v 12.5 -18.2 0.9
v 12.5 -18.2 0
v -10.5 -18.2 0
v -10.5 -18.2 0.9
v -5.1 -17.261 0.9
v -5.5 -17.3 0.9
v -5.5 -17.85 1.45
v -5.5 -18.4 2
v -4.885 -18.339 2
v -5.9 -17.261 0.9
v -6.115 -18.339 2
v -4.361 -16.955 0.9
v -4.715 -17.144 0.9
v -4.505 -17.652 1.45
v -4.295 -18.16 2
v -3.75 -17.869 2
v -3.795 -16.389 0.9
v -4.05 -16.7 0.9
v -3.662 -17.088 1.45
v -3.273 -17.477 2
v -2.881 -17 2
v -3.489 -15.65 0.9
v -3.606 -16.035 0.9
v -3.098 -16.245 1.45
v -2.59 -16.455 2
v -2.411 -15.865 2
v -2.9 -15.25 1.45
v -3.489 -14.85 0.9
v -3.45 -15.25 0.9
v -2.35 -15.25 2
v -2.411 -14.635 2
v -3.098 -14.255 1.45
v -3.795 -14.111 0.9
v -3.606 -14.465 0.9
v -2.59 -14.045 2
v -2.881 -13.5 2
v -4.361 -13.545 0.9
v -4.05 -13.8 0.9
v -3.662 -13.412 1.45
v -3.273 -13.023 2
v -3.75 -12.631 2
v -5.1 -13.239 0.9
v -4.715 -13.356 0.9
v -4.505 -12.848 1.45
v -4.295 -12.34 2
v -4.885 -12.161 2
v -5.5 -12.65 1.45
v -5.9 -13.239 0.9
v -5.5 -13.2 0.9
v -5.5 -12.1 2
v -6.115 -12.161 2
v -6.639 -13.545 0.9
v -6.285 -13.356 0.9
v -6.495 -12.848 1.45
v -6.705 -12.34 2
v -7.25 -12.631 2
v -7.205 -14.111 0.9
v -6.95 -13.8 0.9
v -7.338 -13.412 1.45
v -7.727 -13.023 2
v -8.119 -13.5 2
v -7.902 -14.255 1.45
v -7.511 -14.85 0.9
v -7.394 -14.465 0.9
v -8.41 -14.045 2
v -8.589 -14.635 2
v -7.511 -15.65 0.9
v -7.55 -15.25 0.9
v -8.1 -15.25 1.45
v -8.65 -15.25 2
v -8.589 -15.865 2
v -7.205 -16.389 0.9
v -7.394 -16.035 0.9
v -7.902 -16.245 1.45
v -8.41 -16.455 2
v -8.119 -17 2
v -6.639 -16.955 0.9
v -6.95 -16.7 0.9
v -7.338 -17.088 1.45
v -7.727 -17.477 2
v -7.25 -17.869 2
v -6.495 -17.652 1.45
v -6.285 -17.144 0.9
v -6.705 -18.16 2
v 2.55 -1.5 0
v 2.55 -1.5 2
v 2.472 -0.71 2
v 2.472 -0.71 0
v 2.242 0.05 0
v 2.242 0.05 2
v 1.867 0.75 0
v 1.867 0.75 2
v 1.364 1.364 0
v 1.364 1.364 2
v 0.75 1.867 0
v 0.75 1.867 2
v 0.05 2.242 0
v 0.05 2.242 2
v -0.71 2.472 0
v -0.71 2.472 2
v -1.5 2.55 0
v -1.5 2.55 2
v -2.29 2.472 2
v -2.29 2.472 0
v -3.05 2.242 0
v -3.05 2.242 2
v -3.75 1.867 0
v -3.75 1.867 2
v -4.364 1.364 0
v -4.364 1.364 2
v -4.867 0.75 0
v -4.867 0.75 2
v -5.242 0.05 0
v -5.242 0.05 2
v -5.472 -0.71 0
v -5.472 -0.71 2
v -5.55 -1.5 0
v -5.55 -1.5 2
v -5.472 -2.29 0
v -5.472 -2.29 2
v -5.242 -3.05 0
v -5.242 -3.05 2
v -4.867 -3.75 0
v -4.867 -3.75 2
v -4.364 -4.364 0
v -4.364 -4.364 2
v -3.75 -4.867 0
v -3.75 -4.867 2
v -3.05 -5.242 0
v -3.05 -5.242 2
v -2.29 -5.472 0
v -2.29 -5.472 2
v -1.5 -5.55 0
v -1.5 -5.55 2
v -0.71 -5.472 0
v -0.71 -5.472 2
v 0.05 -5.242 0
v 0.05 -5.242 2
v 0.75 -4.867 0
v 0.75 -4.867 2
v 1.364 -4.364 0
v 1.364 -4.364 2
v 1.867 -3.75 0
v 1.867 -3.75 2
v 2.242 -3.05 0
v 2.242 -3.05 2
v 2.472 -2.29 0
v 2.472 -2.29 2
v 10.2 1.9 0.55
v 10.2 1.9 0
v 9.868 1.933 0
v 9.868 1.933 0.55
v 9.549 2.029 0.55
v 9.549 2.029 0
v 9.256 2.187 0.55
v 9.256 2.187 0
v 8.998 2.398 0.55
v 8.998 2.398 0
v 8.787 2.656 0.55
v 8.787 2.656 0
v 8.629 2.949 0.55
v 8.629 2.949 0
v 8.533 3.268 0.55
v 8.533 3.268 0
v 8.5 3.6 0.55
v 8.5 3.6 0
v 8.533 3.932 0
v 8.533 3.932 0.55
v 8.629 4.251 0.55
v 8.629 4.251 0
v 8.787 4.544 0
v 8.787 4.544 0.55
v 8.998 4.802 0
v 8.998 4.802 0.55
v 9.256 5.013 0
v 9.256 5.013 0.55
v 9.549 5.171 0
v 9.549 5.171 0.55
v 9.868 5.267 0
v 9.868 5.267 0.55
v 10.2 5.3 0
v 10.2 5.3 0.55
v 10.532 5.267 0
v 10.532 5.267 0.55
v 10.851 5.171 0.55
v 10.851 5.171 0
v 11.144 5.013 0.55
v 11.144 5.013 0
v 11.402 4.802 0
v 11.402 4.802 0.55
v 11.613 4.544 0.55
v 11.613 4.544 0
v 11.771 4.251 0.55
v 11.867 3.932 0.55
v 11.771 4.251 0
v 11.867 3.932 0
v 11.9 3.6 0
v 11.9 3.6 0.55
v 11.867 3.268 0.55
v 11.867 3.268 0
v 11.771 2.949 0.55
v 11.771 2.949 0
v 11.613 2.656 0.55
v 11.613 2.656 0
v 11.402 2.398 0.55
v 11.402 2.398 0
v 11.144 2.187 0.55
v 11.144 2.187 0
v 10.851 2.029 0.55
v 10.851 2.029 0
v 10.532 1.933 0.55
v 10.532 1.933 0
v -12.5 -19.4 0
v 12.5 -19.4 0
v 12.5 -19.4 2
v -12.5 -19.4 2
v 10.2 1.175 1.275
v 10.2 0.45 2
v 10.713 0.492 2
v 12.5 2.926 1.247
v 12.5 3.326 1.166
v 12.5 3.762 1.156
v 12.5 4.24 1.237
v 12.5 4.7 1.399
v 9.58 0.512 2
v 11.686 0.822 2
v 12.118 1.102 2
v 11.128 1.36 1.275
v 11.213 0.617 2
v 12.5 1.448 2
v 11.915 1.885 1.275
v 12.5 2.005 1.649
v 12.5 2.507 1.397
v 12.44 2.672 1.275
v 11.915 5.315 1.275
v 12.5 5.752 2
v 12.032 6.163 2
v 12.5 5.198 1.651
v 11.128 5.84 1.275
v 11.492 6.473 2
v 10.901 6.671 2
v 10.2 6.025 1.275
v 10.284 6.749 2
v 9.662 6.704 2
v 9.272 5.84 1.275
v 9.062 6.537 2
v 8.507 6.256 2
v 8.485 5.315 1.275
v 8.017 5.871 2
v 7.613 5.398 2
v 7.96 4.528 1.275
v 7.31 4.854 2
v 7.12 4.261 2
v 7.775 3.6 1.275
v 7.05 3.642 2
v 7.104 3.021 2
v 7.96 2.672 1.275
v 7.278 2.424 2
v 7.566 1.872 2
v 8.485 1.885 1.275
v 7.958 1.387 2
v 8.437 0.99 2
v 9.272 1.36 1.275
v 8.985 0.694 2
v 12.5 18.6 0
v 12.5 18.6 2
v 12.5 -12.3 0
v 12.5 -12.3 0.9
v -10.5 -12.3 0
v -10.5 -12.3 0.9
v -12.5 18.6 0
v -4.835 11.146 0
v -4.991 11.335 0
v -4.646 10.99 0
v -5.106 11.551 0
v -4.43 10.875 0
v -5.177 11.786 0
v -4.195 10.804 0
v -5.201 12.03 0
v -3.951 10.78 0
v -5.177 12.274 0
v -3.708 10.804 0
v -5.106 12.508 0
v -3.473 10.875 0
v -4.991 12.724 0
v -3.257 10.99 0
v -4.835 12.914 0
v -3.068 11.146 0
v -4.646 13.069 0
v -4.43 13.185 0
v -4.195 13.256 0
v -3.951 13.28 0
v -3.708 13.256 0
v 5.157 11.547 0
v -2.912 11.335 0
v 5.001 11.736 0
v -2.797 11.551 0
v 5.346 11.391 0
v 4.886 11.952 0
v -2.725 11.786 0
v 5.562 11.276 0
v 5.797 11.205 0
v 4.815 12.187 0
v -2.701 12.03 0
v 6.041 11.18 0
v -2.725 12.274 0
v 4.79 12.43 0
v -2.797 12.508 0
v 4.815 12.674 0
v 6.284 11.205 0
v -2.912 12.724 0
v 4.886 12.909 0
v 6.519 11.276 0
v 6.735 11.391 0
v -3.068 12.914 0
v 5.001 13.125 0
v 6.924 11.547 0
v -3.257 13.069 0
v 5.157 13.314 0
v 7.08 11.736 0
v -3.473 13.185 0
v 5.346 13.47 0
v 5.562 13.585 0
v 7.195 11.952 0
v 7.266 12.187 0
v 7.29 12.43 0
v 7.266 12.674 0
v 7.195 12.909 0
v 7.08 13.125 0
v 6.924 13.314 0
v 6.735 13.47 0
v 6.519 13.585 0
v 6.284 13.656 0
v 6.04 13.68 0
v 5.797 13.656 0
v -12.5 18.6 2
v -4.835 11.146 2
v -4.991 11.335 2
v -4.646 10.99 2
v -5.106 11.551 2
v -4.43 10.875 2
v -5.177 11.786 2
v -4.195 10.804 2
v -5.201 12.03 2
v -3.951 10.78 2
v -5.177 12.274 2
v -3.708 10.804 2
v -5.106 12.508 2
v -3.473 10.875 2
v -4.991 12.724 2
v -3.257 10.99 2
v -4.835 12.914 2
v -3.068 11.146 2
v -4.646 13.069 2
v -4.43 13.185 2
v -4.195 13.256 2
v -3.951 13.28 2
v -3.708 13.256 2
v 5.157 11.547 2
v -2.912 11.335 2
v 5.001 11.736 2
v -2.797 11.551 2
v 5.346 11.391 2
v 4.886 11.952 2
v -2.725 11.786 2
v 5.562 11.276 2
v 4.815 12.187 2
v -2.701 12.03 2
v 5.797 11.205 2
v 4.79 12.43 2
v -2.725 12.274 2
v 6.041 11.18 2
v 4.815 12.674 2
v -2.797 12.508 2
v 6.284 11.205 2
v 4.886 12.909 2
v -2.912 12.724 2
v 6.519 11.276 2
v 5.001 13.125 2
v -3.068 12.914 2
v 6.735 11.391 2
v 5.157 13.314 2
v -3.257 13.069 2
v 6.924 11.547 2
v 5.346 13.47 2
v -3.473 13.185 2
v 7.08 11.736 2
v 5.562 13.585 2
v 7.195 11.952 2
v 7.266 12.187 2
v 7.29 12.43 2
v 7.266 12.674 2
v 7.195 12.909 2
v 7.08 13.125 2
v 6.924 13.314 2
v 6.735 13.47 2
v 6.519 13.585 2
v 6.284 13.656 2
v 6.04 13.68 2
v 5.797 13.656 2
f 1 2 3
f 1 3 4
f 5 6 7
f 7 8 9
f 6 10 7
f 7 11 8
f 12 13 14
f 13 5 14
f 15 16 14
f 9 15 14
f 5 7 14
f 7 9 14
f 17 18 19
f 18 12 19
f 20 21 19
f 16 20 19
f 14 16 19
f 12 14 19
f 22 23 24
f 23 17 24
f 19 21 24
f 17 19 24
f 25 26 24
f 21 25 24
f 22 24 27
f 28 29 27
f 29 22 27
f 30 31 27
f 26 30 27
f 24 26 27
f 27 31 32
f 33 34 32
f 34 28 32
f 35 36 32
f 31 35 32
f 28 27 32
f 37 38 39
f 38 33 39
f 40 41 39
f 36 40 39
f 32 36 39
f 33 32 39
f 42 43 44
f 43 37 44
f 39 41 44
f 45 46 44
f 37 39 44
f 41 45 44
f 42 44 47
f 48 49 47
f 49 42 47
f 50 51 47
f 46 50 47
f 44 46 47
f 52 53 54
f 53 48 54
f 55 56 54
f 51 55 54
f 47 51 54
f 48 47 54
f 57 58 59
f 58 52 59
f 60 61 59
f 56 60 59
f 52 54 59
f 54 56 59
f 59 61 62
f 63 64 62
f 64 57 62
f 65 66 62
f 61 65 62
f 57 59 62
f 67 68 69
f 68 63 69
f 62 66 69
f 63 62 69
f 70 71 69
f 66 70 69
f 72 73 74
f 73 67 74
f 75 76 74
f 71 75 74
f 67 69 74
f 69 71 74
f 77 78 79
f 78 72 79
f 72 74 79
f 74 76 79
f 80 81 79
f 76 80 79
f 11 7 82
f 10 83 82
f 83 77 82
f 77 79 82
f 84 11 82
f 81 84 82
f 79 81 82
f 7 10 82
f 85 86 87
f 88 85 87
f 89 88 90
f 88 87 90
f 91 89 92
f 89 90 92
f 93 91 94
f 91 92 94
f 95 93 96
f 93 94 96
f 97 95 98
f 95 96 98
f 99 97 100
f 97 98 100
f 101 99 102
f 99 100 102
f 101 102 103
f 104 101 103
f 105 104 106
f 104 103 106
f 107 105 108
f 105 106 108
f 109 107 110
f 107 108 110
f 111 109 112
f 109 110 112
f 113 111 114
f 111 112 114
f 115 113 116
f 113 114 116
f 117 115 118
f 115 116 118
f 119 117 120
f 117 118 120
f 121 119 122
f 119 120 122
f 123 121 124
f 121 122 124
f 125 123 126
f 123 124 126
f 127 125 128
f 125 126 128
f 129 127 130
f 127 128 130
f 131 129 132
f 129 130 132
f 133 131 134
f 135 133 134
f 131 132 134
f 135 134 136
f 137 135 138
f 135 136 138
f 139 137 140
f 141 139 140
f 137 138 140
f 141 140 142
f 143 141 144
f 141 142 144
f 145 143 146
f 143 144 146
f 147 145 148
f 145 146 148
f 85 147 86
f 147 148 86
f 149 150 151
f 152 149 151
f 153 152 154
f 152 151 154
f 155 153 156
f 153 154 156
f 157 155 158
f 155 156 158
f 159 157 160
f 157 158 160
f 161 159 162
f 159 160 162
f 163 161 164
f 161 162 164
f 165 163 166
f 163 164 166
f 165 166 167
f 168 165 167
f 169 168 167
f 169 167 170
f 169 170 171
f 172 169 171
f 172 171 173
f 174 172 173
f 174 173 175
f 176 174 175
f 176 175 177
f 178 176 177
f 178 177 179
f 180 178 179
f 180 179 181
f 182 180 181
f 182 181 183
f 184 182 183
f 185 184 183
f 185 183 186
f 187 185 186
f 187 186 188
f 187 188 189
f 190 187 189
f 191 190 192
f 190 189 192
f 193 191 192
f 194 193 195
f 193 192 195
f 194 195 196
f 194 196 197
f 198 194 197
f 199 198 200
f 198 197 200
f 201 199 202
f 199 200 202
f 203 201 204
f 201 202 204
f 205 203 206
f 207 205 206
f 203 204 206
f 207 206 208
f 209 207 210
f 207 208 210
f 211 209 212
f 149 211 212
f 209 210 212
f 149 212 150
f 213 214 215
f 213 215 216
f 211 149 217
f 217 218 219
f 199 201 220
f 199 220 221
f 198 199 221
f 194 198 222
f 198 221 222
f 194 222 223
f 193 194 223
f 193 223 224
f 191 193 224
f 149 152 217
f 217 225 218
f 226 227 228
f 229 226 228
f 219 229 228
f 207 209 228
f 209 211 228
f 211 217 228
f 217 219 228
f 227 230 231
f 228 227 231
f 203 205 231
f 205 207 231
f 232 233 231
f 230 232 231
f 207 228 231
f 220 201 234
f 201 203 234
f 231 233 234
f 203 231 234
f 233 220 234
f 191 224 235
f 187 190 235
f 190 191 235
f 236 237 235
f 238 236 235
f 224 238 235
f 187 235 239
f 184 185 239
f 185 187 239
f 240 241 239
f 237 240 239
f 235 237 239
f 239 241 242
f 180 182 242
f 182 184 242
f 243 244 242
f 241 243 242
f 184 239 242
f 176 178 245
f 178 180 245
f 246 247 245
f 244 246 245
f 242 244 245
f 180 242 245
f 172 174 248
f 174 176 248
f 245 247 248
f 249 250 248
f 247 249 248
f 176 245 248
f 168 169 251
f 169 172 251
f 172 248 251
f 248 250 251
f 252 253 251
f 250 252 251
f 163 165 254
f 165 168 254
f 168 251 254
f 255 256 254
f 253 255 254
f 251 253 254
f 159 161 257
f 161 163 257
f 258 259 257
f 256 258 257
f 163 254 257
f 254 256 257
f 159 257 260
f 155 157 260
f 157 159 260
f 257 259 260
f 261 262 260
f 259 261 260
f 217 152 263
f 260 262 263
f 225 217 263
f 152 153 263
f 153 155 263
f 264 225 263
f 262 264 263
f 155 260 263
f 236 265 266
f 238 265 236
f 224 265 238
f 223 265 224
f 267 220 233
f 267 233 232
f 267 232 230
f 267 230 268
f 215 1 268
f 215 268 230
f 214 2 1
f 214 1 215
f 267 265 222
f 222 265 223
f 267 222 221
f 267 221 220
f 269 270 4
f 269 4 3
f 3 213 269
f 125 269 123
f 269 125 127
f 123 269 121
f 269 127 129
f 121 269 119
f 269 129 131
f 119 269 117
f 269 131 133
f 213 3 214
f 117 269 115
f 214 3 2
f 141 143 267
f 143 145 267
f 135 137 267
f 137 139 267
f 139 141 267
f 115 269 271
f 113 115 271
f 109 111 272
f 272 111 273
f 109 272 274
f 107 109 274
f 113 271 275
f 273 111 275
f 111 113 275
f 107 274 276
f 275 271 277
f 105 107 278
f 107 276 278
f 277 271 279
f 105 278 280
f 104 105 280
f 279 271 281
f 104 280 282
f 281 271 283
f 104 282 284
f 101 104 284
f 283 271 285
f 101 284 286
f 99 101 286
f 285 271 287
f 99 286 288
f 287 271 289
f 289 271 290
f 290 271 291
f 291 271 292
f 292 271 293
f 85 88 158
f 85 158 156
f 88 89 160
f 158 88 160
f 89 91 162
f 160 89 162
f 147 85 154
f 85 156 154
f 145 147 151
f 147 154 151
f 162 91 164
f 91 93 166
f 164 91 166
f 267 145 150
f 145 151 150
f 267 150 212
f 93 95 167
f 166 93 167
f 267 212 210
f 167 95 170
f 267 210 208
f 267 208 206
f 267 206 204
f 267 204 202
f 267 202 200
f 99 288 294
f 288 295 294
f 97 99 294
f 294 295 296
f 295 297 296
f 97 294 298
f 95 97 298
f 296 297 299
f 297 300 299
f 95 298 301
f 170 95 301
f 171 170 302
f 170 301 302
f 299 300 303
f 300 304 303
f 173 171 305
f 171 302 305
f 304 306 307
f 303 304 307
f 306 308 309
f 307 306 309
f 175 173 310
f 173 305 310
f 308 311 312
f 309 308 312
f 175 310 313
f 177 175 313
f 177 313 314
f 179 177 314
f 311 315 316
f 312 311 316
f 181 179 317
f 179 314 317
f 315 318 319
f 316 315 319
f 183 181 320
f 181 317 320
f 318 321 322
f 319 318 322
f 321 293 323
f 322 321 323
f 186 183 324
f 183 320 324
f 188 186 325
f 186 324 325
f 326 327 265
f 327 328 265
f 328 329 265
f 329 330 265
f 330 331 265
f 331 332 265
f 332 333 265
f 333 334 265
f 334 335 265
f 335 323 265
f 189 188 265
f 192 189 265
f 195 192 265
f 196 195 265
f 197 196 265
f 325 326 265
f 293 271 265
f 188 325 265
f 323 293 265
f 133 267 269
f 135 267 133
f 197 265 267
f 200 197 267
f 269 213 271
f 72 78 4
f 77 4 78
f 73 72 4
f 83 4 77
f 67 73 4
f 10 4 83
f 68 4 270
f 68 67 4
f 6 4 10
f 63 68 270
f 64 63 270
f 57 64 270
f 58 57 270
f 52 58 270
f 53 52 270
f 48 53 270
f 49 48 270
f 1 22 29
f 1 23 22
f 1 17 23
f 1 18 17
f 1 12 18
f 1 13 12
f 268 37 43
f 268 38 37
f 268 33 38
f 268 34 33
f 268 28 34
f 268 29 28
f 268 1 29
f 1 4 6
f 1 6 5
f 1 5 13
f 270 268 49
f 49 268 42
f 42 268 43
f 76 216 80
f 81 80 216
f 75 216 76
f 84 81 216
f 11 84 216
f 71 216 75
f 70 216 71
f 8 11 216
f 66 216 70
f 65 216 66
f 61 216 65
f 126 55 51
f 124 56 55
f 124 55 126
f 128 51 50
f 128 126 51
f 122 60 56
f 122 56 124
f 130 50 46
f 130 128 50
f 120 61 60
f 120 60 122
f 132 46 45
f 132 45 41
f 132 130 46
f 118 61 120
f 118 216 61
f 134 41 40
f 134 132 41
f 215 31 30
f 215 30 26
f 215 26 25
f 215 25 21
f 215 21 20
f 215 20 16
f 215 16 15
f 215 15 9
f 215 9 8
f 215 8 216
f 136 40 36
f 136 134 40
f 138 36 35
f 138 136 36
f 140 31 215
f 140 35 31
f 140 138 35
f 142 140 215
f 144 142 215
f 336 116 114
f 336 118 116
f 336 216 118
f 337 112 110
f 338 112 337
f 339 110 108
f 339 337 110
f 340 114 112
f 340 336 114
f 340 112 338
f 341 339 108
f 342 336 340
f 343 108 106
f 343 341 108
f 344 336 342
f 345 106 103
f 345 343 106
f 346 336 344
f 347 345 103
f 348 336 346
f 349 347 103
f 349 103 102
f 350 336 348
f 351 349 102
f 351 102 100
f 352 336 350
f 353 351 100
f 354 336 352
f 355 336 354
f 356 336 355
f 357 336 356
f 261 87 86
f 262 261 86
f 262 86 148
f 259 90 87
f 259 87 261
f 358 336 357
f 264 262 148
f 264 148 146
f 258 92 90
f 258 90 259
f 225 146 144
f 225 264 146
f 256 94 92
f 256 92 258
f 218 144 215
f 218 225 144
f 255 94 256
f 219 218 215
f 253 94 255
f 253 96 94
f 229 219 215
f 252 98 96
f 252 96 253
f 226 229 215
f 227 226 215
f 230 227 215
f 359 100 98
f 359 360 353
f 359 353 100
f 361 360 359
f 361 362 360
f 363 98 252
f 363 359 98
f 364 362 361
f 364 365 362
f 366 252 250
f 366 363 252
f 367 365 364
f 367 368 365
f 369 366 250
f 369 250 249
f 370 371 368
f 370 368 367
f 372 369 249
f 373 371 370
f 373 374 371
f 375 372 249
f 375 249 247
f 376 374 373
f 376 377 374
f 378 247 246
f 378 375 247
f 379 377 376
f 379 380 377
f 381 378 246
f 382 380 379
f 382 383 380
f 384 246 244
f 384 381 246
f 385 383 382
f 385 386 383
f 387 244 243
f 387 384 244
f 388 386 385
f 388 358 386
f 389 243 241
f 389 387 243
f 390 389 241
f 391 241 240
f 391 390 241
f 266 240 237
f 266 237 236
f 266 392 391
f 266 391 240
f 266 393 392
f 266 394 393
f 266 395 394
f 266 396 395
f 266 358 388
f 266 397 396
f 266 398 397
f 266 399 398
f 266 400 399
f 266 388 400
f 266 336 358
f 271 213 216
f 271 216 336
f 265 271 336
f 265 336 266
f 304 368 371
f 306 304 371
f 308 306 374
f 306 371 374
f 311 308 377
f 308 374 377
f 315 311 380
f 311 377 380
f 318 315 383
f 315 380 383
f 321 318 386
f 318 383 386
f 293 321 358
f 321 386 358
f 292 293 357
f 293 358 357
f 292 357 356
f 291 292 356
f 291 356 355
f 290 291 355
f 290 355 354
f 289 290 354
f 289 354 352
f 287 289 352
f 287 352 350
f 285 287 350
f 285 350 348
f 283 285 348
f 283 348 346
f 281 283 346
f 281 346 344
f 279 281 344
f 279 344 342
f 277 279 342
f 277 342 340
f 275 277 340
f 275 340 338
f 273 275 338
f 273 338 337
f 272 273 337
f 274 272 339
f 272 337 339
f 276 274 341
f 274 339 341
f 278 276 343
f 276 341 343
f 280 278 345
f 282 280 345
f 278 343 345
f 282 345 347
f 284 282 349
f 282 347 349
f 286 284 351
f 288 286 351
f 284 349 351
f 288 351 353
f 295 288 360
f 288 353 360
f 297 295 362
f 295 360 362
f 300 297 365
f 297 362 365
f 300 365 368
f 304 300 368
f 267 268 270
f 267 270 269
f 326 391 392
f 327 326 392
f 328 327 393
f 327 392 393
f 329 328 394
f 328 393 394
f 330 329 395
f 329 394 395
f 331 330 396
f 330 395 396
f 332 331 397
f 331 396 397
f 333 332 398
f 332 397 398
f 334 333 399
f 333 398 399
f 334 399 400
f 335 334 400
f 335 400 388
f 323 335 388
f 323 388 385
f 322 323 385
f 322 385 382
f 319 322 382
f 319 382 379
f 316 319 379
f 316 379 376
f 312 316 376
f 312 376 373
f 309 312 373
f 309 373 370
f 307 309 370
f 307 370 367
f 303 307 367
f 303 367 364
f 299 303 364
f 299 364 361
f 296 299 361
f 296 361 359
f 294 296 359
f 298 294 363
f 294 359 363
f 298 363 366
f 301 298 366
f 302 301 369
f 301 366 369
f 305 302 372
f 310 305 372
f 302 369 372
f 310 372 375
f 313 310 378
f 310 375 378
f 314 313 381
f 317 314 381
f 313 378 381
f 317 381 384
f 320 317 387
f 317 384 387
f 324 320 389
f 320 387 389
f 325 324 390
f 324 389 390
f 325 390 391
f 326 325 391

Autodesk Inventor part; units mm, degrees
ref_plane "YZ Plane" through (0, 0, 0) normal (1, 0, 0) x (0, 1, 0)
ref_plane "XZ Plane" through (0, 0, 0) normal (0, 1, 0) x (-1, 0, 0)
ref_plane "XY Plane" through (0, 0, 0) normal (0, 0, 1) x (1, 0, 0)
sketch "Szkic1" plane through (0, 0, 0) normal (0, 0, 1) x (1, 0, 0)
  line L0 (12.5, 18.6) -> (12.5, -19.4) projected
  line L1 (-12.5, 18.6) -> (12.5, 18.6) projected
  line L2 (12.5, -19.4) -> (-12.5, -19.4)
  line L3 (-12.5, -19.4) -> (-12.5, 18.6)
  line L4 (-12.5, 18.6) -> (12.5, 18.6)
  line L5 (12.5, 18.6) -> (12.5, -19.4)
extrude "Wyciągnięcie proste1" add sketch "Szkic1" along normal blind 2
sketch "Szkic2" plane through (0, 0, 2) normal (0, 0, 1) x (1, 0, 0)
  circle A0 centre (-3.9514, 12.0297) radius 1.25 projected
  circle A1 centre (6.0405, 12.4305) radius 1.25 projected
  circle A2 centre (-1.5, -1.5) radius 4.05 projected
  circle A3 centre (10.2, 3.6) radius 1.2295 projected
  point P0 (0, 0)
  point P1 (-5.5, -15.25)
extrude "Wyciągnięcie proste2" cut sketch "Szkic2" against normal through all contours A0 | A1 | A2
hole "Otwór1" at (10.2, 3.6, 2) at (-5.5, -15.25, 2) direction (0, 0, -1) diameter 3.4 depth 7 tip angle 118 countersink diameter 6.3 countersink angle 90 clearance for "Śruba ze łbem stożkowym ISO 2009/7046" size "M3" standard "ISO"
sketch "Szkic3" plane through (12.5, -18.6, 0) normal (1, 0, 0) x (0, 0, -1)
  line L0 (0, 0.4) -> (-0.9, 0.4)
  line L1 (-0.9, 0.4) -> (-0.9, 6.3)
  line L2 (-0.9, 6.3) -> (0, 6.3)
  line L3 (0, 6.3) -> (0, 0.4)
  point P0 (0, 18.6)
  dimension "d11" = 0.9
extrude "Wyciągnięcie proste3" cut sketch "Szkic3" against normal blind 23
properties part number "OslonaPrawejPrzekladni" material "Aluminium 6061"
